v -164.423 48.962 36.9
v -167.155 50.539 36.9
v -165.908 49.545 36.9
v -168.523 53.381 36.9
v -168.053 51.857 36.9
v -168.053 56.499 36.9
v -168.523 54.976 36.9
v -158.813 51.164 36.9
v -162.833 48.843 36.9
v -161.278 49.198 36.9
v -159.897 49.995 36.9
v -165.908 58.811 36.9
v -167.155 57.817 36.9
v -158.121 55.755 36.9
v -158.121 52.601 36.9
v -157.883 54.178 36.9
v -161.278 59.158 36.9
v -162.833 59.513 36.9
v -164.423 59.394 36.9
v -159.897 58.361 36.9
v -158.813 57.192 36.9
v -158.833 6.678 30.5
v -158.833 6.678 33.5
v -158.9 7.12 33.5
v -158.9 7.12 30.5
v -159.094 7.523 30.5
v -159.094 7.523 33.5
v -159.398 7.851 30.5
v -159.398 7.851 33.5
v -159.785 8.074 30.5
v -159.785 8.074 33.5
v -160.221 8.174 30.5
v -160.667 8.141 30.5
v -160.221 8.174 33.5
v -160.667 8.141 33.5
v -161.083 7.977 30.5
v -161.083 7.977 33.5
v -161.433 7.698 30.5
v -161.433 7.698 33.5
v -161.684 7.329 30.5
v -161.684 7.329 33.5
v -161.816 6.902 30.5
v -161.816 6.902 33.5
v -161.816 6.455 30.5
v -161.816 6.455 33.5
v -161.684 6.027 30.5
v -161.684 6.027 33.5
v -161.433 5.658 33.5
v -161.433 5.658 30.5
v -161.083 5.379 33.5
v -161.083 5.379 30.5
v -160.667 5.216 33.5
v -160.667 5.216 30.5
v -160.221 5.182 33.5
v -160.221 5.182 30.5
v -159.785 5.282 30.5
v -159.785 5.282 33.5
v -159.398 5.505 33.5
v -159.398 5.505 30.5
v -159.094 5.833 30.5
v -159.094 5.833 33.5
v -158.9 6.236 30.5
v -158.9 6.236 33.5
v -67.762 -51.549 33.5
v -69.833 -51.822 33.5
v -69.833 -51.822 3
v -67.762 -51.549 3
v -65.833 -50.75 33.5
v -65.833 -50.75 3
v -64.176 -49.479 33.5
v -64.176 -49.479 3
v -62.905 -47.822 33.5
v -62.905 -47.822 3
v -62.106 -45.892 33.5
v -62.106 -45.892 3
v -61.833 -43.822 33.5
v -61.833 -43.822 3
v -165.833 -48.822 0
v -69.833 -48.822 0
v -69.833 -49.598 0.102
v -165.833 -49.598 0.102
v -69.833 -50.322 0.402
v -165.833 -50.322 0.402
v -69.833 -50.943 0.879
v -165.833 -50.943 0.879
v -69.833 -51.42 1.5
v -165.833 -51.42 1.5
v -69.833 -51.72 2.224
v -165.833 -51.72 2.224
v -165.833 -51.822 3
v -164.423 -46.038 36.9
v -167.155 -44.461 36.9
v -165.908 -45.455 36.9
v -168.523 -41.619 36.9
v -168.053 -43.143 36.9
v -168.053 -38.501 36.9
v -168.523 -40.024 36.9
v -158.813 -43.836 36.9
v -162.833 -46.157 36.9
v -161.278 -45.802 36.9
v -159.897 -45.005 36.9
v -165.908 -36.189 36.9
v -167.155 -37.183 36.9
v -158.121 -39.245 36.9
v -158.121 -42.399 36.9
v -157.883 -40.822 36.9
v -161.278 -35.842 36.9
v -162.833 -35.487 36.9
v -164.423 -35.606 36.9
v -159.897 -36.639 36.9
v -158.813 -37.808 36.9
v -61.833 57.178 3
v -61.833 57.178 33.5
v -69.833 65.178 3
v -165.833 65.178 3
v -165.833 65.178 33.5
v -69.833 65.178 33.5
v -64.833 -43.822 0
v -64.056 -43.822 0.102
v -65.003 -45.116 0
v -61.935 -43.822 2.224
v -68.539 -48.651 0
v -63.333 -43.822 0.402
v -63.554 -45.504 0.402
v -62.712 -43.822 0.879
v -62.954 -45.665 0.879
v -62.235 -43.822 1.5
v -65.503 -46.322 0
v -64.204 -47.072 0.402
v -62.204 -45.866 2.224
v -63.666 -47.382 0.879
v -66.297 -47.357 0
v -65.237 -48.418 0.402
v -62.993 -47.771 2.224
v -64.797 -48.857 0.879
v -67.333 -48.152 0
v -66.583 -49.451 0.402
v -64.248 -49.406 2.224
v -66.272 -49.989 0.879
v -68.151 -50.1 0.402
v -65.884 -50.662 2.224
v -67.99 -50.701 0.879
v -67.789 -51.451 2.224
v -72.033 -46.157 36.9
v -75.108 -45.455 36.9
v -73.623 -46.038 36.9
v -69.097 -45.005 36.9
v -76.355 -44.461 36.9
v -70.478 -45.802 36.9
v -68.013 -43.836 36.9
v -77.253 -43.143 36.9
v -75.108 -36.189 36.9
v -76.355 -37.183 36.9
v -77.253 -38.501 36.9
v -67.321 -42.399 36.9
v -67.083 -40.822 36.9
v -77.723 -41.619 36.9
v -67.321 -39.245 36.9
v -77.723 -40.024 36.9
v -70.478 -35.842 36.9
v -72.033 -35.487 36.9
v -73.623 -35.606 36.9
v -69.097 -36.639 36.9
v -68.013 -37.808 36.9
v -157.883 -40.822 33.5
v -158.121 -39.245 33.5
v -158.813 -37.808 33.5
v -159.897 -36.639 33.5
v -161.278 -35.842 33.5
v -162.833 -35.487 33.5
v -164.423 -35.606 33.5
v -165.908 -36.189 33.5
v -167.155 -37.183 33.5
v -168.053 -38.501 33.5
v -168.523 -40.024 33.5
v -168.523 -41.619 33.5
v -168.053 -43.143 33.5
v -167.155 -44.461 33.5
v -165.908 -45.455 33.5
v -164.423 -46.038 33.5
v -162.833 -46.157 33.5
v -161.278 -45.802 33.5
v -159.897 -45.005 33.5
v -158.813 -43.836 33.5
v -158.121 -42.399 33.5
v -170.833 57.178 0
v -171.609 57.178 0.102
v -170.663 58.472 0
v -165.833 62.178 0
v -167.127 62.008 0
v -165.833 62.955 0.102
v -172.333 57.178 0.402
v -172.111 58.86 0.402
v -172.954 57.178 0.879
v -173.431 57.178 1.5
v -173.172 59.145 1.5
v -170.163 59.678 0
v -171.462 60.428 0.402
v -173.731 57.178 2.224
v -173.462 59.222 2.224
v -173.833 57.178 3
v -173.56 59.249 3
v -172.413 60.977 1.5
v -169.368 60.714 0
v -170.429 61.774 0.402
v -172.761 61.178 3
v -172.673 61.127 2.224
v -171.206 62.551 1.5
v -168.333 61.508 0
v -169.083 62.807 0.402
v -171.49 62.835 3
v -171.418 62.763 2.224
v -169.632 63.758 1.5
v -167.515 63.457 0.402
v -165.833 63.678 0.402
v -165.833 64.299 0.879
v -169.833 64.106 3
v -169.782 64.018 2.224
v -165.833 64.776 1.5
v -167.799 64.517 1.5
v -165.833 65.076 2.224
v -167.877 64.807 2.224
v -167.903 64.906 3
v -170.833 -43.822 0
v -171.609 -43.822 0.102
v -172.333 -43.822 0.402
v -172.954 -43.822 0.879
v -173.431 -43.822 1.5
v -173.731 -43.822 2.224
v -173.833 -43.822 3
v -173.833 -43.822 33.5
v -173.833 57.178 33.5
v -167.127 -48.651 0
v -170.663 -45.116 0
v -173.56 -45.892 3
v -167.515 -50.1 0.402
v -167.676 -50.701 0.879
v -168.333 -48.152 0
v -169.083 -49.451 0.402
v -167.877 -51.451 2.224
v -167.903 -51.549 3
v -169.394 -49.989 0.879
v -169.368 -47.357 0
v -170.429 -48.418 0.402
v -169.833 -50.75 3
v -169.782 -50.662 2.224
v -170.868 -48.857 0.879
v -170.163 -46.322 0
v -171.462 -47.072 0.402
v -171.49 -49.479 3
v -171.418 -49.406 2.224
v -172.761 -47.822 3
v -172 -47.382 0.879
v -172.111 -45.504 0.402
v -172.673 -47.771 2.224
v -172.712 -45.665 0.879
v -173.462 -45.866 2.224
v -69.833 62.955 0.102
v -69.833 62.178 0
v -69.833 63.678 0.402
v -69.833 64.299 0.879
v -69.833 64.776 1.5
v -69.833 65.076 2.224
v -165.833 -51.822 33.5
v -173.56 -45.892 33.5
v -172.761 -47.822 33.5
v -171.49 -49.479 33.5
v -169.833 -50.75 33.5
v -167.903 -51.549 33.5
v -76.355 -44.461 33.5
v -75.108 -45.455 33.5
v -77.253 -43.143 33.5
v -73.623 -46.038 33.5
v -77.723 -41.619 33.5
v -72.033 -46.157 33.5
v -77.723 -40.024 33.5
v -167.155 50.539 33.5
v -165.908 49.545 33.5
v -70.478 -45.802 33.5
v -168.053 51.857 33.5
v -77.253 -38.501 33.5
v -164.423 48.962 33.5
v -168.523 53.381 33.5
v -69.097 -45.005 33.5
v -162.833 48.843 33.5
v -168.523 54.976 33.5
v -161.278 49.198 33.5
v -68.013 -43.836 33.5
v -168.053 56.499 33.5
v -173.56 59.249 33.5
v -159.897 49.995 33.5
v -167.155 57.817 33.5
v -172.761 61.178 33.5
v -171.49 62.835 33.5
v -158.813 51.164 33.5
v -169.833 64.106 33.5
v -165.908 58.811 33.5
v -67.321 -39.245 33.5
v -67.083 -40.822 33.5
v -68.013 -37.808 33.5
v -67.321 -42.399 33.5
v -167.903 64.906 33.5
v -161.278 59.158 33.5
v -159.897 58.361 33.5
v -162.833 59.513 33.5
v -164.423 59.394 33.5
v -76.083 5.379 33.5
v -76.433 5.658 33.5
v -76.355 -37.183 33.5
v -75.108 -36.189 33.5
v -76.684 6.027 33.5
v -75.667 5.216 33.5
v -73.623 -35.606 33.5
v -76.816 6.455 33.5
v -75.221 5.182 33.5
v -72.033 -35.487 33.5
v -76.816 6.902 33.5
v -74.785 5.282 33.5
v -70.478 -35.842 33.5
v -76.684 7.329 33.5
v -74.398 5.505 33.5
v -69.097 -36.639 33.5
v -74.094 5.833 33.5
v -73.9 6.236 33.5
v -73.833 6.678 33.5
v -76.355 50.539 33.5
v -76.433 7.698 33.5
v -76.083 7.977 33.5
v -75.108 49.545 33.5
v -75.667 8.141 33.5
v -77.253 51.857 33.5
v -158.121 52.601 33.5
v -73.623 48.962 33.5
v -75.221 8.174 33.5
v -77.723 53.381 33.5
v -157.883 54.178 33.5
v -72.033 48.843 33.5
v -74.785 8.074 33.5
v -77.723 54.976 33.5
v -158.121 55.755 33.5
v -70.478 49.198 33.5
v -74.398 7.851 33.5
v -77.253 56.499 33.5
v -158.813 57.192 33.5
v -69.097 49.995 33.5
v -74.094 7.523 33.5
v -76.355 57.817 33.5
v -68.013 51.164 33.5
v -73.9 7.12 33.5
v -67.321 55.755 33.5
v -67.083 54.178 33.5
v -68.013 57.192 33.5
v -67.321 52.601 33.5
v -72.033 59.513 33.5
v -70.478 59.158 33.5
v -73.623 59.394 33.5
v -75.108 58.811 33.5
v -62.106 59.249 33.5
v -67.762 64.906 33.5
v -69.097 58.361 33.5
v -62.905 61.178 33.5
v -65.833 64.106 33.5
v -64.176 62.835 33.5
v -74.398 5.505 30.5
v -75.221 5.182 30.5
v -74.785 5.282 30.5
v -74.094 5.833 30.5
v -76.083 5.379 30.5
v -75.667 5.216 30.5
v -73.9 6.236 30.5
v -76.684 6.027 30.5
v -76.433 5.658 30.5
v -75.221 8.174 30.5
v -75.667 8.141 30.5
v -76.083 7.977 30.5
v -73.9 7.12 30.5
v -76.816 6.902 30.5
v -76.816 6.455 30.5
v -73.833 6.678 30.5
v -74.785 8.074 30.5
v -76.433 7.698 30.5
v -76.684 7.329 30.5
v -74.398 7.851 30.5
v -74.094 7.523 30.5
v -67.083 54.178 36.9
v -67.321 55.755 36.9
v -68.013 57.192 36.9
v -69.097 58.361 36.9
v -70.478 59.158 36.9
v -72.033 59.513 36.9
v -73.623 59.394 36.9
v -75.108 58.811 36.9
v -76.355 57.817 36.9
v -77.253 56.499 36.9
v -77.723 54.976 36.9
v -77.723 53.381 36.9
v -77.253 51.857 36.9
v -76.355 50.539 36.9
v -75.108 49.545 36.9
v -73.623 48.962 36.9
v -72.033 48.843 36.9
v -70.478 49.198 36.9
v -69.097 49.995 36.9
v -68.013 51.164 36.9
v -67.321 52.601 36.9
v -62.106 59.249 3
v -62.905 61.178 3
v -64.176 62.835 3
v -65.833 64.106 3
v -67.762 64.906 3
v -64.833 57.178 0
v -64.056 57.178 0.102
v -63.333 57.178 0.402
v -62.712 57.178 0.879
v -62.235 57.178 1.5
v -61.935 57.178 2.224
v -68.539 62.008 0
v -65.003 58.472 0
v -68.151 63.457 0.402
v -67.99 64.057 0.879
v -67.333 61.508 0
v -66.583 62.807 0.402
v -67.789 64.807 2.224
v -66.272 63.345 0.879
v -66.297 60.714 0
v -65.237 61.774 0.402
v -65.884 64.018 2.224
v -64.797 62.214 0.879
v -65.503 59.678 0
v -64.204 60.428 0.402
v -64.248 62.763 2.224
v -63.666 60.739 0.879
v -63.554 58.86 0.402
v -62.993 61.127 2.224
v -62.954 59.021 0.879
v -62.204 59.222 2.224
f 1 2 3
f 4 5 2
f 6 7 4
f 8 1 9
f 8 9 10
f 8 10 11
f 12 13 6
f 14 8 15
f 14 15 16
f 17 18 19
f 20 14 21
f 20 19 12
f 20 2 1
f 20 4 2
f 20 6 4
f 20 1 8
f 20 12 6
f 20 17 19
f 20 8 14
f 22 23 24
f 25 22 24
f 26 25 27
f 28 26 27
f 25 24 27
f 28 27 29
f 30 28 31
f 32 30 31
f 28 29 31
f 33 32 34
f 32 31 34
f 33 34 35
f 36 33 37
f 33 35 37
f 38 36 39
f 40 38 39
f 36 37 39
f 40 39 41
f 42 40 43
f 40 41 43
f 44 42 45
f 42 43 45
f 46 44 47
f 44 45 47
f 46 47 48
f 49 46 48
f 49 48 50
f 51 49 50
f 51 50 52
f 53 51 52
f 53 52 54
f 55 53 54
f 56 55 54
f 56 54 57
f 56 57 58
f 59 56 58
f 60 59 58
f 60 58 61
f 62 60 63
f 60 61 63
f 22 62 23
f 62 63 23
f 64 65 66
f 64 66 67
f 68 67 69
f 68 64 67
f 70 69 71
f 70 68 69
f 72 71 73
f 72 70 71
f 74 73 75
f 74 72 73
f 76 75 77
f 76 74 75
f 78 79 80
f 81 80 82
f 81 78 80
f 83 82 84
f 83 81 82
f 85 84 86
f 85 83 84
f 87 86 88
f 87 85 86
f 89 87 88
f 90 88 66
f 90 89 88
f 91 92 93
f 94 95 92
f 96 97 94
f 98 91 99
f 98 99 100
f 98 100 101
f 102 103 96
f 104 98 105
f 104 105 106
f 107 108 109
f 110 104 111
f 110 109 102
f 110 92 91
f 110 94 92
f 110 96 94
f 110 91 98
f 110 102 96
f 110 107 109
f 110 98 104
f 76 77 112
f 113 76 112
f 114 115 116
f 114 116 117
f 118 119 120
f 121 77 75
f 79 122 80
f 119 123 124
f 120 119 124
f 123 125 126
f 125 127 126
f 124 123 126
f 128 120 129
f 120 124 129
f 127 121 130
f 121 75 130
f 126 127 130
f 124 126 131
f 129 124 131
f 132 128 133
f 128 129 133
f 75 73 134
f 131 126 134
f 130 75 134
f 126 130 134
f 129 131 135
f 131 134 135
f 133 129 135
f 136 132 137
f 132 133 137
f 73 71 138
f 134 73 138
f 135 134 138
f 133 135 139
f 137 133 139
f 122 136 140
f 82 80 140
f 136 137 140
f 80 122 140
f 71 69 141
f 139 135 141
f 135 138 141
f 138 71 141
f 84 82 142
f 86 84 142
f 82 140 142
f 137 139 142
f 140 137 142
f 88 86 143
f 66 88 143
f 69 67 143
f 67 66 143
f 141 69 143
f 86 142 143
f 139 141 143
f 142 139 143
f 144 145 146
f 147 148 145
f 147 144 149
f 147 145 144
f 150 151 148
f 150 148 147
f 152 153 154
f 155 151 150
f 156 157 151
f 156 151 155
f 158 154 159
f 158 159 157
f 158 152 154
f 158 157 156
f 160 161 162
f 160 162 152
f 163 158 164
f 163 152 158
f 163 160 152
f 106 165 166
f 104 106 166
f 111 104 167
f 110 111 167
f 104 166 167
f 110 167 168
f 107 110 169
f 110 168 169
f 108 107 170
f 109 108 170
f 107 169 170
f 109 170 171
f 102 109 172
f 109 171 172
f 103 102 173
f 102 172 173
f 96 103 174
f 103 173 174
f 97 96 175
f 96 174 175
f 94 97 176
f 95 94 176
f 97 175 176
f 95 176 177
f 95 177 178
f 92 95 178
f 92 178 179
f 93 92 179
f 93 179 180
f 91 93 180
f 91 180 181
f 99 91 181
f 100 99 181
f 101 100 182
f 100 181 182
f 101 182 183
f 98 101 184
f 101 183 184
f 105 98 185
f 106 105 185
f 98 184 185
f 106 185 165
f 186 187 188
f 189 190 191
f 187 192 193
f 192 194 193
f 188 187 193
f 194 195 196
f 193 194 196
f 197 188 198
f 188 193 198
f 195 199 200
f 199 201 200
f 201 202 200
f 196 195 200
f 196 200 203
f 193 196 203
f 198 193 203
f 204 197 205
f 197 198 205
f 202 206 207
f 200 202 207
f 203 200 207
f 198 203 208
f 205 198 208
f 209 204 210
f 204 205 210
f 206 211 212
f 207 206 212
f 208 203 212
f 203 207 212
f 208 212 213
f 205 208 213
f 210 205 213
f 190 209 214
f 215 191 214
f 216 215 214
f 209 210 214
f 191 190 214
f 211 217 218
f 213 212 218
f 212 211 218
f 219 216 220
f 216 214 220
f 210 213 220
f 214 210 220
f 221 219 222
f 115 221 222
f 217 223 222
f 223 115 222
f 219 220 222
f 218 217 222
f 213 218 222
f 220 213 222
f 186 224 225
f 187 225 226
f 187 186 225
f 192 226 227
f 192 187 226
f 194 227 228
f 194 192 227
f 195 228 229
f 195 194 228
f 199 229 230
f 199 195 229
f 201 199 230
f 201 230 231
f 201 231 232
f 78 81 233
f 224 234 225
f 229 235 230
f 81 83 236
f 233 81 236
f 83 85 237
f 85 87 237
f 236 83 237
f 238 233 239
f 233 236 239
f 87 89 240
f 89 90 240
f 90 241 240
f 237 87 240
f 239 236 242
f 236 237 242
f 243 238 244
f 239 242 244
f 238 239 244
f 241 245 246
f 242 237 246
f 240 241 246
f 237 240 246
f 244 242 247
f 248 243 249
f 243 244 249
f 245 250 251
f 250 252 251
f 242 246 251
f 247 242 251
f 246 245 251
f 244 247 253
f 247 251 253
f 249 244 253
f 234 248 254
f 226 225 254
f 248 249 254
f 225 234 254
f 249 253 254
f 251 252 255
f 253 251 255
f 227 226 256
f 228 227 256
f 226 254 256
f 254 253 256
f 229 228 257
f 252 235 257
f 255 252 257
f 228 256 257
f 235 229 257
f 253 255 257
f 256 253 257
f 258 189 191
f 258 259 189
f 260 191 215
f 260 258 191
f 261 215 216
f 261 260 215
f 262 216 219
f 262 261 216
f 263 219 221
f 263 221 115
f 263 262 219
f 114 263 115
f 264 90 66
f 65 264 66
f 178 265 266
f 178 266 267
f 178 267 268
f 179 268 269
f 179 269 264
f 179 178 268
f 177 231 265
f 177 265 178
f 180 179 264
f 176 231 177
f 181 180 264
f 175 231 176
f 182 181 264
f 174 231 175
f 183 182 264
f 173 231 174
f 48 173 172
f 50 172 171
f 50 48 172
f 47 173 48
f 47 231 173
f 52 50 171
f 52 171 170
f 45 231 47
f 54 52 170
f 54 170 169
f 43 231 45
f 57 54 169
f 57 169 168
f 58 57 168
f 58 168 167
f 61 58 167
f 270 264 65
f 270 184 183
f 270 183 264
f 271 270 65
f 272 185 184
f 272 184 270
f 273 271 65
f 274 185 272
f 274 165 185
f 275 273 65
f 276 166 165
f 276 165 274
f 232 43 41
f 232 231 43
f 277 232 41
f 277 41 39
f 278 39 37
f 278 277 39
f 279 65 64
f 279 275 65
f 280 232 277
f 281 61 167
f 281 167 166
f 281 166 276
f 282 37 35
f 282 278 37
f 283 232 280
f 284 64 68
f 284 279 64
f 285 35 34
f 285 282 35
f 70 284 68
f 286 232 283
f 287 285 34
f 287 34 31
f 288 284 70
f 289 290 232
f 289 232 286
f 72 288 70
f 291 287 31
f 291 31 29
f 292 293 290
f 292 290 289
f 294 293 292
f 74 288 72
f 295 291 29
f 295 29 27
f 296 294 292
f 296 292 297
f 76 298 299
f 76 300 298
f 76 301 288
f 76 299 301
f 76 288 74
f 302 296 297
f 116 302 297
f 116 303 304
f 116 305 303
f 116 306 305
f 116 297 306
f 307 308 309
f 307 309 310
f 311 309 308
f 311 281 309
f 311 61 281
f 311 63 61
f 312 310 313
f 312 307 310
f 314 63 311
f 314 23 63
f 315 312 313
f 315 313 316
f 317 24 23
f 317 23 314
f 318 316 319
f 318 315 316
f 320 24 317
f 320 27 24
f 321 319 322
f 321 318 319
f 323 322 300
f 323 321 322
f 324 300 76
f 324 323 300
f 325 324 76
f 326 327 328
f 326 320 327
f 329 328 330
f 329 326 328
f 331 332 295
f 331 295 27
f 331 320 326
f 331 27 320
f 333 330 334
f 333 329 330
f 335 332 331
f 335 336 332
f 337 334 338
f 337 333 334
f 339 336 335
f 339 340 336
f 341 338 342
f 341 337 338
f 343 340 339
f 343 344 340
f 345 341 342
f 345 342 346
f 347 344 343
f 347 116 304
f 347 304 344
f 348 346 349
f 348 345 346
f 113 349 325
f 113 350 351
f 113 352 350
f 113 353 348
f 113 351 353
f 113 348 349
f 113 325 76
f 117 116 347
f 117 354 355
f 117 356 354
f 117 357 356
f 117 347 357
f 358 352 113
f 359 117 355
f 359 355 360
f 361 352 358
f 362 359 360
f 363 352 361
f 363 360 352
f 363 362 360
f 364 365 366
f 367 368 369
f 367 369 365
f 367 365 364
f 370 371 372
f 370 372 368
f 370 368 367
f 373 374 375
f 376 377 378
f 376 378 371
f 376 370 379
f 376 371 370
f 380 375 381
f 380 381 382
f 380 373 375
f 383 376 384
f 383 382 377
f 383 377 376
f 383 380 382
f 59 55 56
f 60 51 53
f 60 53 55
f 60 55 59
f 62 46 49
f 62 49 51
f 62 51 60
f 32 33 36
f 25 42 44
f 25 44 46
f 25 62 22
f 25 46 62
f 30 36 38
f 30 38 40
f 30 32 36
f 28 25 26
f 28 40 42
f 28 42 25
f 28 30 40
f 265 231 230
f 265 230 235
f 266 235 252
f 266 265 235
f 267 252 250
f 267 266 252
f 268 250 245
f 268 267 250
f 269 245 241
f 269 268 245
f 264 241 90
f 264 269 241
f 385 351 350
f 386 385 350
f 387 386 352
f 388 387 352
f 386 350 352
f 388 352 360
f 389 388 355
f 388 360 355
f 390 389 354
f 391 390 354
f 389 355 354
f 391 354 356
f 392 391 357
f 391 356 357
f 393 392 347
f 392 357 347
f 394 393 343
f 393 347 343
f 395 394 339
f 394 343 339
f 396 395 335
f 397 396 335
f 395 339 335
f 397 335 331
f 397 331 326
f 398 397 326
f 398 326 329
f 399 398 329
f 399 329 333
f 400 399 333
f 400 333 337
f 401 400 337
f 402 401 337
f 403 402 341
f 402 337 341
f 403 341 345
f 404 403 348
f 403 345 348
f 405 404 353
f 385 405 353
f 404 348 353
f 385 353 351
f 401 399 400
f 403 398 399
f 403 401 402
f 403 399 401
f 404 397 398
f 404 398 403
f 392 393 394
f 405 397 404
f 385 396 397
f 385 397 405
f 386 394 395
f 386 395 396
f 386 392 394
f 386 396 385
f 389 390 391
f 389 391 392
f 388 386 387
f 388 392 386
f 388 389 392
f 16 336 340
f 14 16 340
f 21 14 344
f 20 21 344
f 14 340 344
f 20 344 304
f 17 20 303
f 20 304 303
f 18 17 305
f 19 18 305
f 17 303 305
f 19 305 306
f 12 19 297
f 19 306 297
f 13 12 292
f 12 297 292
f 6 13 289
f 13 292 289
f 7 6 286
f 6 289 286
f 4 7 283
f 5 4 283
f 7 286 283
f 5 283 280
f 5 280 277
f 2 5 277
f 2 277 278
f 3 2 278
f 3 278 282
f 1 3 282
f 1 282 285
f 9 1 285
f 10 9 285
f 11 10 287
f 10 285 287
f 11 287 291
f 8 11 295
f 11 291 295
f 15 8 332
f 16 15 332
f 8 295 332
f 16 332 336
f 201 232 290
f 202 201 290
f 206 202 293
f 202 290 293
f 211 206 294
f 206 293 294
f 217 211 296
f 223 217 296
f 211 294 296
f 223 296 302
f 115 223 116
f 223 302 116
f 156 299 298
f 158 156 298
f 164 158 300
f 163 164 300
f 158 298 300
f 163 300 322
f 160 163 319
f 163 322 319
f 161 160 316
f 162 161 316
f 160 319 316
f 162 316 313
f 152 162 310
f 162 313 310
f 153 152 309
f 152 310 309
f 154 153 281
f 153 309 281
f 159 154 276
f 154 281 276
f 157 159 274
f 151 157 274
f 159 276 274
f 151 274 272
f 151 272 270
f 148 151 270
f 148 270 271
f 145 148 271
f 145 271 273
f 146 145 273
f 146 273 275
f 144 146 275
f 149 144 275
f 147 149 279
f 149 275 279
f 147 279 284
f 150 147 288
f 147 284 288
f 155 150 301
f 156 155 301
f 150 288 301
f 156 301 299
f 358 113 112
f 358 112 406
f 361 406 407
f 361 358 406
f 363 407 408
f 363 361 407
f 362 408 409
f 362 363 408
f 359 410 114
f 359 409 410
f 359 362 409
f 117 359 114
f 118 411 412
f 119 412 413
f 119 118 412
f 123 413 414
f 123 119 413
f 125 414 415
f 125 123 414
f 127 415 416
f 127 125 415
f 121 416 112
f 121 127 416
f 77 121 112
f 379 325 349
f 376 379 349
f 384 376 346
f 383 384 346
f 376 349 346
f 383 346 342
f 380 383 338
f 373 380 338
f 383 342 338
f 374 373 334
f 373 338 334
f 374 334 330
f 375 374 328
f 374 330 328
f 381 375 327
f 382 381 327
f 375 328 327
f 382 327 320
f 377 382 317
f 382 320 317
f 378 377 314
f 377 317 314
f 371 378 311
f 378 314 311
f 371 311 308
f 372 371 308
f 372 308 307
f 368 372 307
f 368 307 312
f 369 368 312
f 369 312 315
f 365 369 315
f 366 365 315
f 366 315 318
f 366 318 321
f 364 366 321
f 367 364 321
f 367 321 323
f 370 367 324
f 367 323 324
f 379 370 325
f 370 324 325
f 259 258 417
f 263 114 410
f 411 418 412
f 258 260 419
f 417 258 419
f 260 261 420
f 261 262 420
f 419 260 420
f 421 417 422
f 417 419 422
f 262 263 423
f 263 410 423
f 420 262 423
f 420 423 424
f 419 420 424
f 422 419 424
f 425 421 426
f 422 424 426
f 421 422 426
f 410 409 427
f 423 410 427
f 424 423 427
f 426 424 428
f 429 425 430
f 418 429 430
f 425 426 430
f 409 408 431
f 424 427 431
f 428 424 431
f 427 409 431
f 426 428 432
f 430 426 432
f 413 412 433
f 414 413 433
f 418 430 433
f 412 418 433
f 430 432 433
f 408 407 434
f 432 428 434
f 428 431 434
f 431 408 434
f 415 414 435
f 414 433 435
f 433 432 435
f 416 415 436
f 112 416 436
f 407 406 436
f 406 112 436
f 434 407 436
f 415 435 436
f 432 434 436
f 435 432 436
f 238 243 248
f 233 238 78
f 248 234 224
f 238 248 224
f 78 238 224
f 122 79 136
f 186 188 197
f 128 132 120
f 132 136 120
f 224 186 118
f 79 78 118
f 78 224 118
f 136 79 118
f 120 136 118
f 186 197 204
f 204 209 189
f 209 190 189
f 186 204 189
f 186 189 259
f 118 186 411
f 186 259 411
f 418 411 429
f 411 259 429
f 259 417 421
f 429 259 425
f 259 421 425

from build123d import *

# Parameters (mm, degrees)
SKETCH_1_W          = 112
SKETCH_1_H          = 117
EXTRUDE_1_DEPTH     = 33.5
FILLET_1_R          = 8
SKETCH_2_R          = 1.5
CUT_EXTRUDE_1_DEPTH = 3
SKETCH_3_R          = 5.35
EXTRUDE_2_DEPTH     = 3.4
FILLET_2_R          = 3


with BuildPart() as part:
    # 草图1 → 凸台-拉伸1 (new body)
    with BuildSketch(Plane.XY):
        with Locations((-117.832945126, 6.678161232)):
            Rectangle(SKETCH_1_W, SKETCH_1_H)
    extrude(amount=EXTRUDE_1_DEPTH)

    # 圆角1
    fillet_1_edges = [part.edges().sort_by_distance(p)[0] for p in [
        (-173.832945126, 65.178161232, 16.75),
        (-61.832945126, 65.178161232, 16.75),
        (-61.832945126, -51.821838768, 16.75),
        (-173.832945126, -51.821838768, 16.75),
    ]]
    fillet(fillet_1_edges, radius=FILLET_1_R)

    # 草图2 → 切除-拉伸1 (cut)
    with BuildSketch(Plane.XY.offset(33.5)):
        with Locations((-75.332945126, 6.678161232)):
            Circle(SKETCH_2_R)
        with Locations((-160.332945126, 6.678161232)):
            Circle(SKETCH_2_R)
    extrude(amount=-CUT_EXTRUDE_1_DEPTH, mode=Mode.SUBTRACT)

    # 草图3 → 凸台-拉伸2 (add)
    with BuildSketch(Plane.XY.offset(33.5)):
        with Locations((-72.432945126, -40.821838768)):
            Circle(SKETCH_3_R)
        with Locations((-163.232945126, -40.821838768)):
            Circle(SKETCH_3_R)
        with Locations((-163.232945126, 54.178161232)):
            Circle(SKETCH_3_R)
        with Locations((-72.432945126, 54.178161232)):
            Circle(SKETCH_3_R)
    extrude(amount=EXTRUDE_2_DEPTH)

    # 圆角2
    fillet_2_edges = [part.edges().sort_by_distance(p)[0] for p in [
        (-117.832945126, 65.178161232, 0),
        (-173.832945126, 6.678161232, 0),
        (-61.832945126, 6.678161232, 0),
        (-117.832945126, -51.821838768, 0),
        (-64.176090876, -49.478693018, 0),
        (-171.489799375, -49.478693018, 0),
        (-171.489799375, 62.835015481, 0),
        (-64.176090876, 62.835015481, 0),
    ]]
    fillet(fillet_2_edges, radius=FILLET_2_R)


solid = part.part
